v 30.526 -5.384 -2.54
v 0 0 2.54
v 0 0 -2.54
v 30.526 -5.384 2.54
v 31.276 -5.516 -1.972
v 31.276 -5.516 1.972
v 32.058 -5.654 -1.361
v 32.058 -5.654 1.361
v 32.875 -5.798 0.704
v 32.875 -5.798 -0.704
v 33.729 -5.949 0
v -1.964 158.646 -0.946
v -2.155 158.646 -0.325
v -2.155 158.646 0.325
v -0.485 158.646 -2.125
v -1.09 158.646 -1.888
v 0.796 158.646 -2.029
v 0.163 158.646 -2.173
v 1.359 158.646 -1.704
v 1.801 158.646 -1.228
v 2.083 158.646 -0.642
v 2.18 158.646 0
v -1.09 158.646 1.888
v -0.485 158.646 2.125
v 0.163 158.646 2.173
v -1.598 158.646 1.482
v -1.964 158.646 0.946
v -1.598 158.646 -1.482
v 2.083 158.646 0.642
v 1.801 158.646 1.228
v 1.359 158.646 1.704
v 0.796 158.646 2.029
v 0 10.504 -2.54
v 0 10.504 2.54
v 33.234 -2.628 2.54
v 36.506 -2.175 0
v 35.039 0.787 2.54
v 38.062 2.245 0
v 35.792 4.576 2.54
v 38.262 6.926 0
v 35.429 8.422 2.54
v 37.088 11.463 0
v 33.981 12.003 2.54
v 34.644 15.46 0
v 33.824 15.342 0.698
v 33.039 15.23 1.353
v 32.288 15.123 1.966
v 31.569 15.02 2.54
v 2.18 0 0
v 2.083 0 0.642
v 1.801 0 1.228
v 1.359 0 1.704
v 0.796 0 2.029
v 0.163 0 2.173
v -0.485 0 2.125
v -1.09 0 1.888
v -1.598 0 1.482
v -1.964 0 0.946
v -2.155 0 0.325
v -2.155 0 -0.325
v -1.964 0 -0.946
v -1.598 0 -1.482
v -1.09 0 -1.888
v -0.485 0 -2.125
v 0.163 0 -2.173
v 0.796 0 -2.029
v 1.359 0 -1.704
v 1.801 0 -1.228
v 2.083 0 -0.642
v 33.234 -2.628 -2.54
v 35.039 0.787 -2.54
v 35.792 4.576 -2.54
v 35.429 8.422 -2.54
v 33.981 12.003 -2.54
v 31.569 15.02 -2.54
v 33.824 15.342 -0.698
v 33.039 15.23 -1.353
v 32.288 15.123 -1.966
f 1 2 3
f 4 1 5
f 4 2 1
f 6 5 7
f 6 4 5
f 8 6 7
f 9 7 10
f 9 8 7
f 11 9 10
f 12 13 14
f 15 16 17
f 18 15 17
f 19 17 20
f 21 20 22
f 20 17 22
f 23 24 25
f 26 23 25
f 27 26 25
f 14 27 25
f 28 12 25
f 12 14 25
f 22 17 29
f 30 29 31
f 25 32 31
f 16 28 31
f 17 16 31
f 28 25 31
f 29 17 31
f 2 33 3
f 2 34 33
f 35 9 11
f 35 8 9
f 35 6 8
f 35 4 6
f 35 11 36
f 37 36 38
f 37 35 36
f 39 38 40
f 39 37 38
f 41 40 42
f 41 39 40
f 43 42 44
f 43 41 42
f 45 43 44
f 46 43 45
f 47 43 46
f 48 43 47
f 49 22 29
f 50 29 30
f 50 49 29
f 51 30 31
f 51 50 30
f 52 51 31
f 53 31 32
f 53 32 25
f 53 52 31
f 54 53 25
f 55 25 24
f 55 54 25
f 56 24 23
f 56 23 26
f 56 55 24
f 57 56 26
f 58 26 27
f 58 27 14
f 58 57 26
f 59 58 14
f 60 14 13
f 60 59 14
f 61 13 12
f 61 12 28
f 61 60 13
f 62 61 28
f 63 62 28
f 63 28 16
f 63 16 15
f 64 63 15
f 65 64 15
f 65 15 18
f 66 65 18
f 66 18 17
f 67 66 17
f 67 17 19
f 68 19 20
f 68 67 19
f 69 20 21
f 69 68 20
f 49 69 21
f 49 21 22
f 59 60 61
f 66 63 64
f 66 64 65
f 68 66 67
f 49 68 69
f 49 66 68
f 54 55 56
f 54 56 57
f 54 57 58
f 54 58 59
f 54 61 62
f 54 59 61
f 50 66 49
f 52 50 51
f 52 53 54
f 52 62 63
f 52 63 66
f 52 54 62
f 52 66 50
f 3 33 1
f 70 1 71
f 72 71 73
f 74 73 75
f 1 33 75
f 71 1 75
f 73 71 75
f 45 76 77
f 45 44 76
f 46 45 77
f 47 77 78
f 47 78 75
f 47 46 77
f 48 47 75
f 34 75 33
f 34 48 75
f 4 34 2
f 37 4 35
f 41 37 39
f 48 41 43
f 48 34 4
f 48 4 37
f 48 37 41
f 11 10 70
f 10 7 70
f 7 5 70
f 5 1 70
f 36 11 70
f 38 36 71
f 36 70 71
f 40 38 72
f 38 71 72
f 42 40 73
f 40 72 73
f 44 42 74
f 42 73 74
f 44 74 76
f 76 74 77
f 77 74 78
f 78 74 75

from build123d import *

# Parameters (mm, degrees)
F0_R          = 2.179542758
F1_DEPTH      = 158.64632
F3_DEPTH      = 2.54
F3_DEPTH_BACK = 2.54
F4_SIZE       = 2.53999


# Not quite as in the source:
# - a fillet or chamfer is up to 0.001 mm smaller than in the source, because OpenCascade refuses the exact size


with BuildPart() as f1:
    # F0 (on Front) → F1 (new body)
    with BuildSketch(Plane.XZ):
        Circle(F0_R)
    extrude(amount=-F1_DEPTH)


with BuildPart() as f3:
    # F2 (on Top) → F3 (new body, two sides)
    with BuildSketch(Plane.XY) as f3_sk:
        with BuildLine():
            Line((0, 10.5042038485), (0, 0))
            Line((0, 0), (33.7287560105, -5.9487139806))
            ThreePointArc((33.7287560105, -5.9487139806), (38.33498105, 4.5782306181), (34.6436500549, 15.4597721994))
            Line((34.6436500549, 15.4597721994), (0, 10.5042038485))
        make_face()
    extrude(amount=F3_DEPTH)
    extrude(f3_sk.sketch, amount=-F3_DEPTH_BACK)

    # F4 (size 2.54 in the source; OpenCascade refuses exactly that, so slightly less here)
    f4_edges = [f3.edges().sort_by_distance(p)[0] for p in [
        (38.334981, 4.578231, -2.54),
        (38.334981, 4.578231, 2.54),
    ]]
    chamfer(f4_edges, length=F4_SIZE)


solid = Compound([f1.part, f3.part])
